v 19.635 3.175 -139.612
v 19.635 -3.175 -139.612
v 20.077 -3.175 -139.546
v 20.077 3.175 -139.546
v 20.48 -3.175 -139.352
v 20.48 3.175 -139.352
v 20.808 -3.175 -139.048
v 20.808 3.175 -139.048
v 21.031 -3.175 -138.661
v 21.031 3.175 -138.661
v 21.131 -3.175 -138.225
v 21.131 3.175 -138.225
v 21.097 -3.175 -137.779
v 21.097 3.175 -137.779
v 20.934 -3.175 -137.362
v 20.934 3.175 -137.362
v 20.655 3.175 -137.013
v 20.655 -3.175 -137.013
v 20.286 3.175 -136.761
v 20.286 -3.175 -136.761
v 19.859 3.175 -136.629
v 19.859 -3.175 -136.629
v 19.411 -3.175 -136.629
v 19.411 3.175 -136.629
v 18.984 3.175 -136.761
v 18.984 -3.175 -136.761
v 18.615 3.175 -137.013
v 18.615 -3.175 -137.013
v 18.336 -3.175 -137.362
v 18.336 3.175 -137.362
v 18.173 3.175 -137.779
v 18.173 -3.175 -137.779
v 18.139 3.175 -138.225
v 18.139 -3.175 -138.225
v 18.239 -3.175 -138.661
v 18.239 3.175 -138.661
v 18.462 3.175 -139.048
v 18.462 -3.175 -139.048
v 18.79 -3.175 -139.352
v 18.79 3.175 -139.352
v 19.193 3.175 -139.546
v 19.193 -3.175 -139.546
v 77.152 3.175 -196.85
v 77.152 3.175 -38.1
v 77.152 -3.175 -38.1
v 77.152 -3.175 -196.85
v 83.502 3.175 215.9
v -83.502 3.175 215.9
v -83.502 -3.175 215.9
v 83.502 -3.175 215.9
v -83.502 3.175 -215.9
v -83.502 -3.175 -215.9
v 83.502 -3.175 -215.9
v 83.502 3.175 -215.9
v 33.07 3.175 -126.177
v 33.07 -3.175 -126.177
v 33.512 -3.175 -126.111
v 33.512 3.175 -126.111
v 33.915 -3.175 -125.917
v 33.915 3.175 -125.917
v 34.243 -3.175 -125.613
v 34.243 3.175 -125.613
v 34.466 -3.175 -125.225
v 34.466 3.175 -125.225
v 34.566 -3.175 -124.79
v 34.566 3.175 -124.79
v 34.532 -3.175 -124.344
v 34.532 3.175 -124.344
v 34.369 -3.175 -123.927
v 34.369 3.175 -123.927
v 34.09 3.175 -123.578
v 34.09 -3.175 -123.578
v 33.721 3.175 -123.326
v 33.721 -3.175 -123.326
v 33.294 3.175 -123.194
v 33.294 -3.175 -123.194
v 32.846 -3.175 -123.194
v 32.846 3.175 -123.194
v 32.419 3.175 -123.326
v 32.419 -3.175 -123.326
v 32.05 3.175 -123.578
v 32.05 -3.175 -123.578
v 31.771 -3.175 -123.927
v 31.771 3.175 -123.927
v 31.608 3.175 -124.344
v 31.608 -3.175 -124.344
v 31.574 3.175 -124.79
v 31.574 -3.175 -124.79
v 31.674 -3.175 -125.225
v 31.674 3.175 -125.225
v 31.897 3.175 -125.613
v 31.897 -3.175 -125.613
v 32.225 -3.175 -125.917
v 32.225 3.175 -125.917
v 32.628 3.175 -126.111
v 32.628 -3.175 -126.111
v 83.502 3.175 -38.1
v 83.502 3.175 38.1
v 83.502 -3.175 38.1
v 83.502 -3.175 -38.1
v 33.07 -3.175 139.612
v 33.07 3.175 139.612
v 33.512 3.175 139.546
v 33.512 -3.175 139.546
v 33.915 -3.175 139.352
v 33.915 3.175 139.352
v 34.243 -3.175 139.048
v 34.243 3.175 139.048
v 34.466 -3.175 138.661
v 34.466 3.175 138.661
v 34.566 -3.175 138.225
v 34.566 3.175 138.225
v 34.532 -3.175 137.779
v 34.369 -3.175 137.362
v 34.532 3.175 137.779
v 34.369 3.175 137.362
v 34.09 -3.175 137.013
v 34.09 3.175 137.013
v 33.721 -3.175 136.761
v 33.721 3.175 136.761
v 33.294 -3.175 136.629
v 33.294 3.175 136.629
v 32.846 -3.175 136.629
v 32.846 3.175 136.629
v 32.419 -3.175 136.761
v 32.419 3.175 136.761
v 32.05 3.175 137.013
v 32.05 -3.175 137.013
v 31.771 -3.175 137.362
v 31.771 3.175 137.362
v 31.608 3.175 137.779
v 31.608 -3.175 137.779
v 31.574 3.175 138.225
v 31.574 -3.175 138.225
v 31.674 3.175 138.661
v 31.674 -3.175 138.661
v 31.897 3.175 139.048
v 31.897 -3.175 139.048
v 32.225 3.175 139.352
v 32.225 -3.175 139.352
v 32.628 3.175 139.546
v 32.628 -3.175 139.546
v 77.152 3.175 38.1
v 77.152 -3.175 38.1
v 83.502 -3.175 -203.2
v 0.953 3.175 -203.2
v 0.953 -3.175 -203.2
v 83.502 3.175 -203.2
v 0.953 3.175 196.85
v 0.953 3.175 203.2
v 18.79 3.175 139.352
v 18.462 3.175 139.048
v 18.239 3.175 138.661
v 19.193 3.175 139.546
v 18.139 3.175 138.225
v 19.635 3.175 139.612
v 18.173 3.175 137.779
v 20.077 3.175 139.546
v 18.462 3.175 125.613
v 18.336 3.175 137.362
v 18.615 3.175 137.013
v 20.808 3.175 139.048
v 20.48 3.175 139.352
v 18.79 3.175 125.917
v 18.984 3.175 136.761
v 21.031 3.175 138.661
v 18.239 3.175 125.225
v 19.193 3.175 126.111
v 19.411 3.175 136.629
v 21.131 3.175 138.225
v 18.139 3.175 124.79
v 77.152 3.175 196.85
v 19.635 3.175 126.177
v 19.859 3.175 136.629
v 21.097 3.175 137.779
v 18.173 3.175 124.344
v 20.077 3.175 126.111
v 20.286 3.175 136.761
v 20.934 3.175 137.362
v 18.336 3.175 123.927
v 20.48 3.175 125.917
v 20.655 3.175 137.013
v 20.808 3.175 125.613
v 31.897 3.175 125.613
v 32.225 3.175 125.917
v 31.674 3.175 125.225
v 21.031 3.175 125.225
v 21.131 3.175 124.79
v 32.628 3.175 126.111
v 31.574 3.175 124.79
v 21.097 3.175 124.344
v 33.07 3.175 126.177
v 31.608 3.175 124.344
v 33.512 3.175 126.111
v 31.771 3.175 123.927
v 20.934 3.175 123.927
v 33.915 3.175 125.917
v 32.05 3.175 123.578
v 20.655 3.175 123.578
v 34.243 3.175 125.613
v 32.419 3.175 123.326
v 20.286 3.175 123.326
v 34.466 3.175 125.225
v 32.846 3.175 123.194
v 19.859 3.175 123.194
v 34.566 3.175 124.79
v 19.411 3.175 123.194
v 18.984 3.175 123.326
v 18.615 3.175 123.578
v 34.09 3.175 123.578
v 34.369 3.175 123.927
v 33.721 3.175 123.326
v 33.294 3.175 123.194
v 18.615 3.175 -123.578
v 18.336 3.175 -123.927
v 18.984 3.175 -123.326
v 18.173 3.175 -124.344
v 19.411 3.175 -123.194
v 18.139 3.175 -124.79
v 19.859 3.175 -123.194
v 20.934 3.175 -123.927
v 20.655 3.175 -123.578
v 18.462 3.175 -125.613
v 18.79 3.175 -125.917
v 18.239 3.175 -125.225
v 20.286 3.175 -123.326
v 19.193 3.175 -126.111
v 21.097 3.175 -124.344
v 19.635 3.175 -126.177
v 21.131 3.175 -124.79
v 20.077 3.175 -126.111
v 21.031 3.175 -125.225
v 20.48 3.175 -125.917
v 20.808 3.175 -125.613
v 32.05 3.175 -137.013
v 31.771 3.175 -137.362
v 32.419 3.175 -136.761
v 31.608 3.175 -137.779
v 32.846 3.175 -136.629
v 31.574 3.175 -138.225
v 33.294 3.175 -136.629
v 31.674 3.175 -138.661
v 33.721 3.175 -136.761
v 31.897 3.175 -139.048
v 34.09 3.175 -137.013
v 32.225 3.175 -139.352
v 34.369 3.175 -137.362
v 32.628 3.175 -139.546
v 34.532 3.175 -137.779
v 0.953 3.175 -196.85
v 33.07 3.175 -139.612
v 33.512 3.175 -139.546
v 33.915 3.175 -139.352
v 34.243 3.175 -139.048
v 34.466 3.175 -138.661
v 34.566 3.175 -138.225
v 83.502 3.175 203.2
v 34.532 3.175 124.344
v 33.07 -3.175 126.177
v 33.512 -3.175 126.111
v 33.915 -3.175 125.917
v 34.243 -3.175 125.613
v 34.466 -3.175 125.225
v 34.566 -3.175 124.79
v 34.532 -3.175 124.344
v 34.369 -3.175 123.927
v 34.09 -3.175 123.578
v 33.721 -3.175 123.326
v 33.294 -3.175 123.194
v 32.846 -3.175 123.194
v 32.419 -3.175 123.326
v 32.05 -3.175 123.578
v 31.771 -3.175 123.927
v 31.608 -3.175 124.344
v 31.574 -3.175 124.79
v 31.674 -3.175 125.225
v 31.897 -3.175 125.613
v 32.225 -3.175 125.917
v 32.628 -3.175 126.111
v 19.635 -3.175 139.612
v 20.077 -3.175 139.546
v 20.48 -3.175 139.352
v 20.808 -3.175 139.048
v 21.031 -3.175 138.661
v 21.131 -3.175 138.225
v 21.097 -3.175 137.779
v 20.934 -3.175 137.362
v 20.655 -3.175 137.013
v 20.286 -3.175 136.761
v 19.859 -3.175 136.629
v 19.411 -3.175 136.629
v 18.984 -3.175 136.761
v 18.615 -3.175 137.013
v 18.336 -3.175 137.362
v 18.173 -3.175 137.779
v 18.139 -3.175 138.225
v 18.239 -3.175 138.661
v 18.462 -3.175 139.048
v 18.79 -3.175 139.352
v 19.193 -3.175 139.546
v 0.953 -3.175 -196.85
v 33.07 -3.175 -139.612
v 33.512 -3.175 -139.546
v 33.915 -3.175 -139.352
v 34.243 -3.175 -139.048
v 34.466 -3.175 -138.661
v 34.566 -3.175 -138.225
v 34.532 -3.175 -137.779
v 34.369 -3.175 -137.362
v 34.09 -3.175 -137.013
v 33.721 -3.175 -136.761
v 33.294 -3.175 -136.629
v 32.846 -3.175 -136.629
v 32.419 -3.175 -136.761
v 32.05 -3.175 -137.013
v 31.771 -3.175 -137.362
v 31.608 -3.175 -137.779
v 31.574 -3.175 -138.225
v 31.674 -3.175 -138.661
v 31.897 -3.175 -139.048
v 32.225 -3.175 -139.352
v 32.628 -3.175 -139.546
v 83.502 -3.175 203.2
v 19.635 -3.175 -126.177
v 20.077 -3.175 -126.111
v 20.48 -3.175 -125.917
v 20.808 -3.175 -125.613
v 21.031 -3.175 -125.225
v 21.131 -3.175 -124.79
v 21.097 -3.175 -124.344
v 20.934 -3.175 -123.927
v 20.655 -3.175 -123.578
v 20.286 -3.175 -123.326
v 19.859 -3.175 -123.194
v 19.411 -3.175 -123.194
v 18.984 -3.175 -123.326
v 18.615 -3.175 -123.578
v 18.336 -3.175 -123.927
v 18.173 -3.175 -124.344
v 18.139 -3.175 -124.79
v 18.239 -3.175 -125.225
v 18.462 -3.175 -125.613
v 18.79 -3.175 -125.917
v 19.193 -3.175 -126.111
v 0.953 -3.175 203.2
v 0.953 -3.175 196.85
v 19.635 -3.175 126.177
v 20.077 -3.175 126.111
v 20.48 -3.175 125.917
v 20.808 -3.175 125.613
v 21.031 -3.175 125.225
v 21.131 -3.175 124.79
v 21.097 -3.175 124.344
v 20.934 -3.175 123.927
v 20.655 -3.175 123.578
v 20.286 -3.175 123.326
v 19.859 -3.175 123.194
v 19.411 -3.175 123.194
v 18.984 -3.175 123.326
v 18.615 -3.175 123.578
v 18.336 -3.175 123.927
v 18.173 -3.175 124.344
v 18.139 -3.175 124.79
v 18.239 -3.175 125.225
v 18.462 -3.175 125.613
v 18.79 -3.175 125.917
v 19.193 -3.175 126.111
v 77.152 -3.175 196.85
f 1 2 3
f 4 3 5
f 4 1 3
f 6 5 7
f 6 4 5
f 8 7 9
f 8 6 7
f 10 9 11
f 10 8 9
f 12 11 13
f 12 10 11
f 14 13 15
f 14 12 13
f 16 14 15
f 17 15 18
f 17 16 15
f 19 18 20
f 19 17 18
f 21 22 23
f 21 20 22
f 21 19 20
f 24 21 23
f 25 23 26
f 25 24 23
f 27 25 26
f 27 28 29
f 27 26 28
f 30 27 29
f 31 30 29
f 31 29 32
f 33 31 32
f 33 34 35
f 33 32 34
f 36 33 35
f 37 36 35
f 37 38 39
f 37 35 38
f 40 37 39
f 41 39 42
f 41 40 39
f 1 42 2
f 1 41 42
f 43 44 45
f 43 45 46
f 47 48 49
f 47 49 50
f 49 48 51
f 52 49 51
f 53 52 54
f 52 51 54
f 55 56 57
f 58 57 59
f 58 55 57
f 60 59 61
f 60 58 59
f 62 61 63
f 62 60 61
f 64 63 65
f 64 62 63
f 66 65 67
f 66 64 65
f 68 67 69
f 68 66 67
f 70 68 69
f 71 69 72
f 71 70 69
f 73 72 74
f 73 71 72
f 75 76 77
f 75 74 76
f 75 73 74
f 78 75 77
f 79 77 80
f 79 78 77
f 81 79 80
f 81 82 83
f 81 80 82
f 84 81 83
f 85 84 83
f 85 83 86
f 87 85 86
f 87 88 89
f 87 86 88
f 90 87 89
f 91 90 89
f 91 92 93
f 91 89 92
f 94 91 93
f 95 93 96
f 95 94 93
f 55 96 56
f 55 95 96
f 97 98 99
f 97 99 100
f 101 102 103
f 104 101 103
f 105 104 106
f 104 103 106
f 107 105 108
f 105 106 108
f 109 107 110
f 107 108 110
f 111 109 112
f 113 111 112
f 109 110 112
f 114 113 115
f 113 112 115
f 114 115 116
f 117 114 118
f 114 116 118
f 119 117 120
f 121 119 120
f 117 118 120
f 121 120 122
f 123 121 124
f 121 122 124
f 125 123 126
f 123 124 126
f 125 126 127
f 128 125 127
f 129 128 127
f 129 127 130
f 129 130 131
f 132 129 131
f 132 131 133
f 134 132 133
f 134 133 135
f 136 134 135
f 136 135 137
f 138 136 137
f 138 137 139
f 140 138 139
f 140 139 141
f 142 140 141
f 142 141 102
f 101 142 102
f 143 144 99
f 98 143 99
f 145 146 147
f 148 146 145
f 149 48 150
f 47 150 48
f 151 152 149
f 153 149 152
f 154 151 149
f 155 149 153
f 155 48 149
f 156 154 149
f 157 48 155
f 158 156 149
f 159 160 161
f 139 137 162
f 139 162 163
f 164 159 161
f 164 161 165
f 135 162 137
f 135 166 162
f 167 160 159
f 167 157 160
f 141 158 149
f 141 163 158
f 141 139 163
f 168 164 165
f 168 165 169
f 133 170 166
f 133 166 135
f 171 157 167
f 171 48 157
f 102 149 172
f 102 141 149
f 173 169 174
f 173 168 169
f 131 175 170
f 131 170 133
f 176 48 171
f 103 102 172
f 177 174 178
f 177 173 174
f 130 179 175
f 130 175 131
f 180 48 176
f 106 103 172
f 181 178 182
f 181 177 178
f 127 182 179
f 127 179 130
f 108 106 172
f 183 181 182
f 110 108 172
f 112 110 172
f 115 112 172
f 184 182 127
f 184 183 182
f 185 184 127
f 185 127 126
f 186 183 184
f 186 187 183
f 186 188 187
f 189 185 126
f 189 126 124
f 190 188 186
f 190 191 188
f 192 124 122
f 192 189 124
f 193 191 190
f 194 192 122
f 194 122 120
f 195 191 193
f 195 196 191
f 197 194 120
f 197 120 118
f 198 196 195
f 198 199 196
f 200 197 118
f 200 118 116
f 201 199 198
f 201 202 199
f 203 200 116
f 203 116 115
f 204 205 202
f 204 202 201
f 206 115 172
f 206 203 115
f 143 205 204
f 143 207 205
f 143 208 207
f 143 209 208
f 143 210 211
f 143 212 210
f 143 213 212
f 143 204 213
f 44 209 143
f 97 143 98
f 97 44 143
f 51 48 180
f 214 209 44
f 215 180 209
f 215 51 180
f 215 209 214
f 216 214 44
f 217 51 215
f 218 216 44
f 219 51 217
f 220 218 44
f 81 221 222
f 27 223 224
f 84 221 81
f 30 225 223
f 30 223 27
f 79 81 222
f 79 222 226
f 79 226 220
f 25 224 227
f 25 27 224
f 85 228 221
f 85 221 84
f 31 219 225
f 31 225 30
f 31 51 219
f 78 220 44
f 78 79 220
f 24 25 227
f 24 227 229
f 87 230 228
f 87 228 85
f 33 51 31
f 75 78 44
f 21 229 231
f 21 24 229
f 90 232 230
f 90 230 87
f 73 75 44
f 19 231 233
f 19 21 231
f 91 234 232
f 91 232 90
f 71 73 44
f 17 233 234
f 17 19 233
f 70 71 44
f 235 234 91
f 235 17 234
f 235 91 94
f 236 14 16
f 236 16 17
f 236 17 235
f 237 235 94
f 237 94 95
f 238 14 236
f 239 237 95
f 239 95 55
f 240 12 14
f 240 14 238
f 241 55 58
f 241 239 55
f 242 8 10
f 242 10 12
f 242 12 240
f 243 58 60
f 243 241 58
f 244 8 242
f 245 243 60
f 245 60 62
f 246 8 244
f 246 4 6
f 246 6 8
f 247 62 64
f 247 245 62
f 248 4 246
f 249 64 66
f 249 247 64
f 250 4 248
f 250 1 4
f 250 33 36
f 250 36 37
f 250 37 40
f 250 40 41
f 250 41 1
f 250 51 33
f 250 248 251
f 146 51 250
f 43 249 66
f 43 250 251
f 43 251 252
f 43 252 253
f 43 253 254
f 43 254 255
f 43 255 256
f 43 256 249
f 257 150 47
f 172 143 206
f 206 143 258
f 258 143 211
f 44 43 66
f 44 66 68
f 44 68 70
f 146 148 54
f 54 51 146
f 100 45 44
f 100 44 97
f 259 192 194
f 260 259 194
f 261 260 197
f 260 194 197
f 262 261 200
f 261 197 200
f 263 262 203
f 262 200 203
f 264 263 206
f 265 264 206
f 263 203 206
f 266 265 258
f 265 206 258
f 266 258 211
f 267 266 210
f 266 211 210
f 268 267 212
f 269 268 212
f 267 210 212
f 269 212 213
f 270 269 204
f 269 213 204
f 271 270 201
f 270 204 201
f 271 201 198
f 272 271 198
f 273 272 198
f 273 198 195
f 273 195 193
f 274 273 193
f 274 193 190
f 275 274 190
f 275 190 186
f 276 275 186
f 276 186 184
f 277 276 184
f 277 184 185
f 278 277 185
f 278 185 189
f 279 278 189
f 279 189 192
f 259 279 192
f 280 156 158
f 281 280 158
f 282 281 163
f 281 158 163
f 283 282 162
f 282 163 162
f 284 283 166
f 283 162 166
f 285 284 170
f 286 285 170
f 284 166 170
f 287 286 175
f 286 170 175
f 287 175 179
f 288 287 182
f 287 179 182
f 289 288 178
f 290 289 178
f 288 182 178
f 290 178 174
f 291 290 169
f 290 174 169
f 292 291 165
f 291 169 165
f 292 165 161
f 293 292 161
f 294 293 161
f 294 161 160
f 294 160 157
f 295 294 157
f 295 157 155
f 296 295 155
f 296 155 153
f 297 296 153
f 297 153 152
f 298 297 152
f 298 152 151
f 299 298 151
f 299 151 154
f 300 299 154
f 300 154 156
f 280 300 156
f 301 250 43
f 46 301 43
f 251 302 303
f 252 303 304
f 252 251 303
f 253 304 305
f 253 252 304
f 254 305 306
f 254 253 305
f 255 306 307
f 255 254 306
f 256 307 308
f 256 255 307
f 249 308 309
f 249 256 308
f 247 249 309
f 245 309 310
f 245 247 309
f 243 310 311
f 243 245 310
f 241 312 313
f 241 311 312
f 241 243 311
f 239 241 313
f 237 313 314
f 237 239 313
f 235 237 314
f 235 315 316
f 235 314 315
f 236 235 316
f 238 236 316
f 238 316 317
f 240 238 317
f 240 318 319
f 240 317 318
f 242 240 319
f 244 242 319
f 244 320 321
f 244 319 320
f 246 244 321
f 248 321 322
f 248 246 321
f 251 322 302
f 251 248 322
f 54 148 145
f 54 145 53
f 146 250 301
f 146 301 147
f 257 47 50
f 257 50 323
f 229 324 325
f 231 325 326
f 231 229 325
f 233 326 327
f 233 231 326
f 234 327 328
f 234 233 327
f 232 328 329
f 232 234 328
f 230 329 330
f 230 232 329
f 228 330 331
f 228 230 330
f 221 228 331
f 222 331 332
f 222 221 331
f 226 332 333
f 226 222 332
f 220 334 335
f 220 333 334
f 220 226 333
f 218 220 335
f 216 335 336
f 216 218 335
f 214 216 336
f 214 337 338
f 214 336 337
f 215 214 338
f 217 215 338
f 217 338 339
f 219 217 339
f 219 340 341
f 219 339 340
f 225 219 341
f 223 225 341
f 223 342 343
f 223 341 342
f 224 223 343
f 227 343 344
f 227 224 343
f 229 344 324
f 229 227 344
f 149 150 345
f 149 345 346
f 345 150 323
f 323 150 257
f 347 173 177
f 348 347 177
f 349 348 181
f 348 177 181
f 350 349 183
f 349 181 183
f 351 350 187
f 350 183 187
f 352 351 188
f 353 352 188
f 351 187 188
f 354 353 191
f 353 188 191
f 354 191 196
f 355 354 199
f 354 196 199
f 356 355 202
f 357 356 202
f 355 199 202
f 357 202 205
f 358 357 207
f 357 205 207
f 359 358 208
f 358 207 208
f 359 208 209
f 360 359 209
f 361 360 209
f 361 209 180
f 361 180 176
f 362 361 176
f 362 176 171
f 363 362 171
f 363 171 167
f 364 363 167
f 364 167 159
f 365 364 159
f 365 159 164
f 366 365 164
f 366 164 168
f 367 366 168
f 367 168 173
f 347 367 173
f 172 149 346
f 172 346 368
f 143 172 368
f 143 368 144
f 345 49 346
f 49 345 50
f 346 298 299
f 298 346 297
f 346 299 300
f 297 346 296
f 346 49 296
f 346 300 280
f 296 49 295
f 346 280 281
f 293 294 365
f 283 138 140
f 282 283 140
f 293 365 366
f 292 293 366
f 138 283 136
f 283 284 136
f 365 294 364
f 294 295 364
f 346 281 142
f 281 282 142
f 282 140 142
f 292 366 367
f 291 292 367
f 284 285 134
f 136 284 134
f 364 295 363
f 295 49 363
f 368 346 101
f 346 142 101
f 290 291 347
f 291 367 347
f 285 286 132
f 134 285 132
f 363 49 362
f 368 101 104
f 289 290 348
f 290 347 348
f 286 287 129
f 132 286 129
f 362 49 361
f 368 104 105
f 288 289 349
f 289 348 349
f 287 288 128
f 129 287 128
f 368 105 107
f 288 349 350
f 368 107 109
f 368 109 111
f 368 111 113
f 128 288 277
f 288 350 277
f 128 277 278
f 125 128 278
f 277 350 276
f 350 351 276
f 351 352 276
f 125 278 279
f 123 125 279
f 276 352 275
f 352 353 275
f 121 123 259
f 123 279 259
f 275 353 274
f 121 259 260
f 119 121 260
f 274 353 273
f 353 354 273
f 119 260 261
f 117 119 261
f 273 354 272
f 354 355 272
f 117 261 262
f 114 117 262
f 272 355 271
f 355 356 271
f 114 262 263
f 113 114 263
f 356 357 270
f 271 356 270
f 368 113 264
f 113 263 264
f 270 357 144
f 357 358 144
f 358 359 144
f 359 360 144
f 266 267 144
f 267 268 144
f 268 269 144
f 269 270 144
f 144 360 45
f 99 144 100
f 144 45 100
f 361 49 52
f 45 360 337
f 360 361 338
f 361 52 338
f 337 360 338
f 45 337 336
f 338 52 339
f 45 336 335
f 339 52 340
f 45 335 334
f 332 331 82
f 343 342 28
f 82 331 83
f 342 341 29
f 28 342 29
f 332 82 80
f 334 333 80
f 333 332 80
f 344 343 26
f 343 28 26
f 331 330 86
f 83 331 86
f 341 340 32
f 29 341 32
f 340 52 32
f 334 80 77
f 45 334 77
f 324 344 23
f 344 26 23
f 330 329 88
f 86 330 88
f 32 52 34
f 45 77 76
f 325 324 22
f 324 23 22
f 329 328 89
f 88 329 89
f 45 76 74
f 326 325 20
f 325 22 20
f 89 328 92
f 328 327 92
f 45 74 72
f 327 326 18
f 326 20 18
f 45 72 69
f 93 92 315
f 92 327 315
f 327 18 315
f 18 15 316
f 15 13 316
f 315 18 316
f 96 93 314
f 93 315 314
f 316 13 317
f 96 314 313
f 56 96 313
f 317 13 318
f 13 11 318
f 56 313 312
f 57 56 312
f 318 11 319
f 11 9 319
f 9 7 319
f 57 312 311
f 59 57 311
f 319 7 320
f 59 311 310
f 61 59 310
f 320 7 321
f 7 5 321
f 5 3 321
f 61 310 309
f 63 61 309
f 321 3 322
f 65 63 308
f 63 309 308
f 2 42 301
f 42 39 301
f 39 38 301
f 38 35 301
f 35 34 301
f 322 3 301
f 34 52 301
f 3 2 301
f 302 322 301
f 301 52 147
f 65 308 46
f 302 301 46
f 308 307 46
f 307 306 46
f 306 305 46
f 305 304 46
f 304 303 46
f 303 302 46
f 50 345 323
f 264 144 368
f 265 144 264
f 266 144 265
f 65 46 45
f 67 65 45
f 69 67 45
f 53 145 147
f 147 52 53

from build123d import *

# Parameters (mm, degrees)
SKETCH2_W           = 167.005
SKETCH2_H           = 431.8
BOSS_EXTRUDE2_DEPTH = 3.175
SKETCH3_W           = 6.35
SKETCH3_H           = 393.7
CUT_EXTRUDE1_DEPTH  = 232.572450879
SKETCH6_R           = 1.5
CUT_EXTRUDE3_DEPTH  = 232.572450879
SKETCH7_W           = 82.55
SKETCH7_H           = 6.35
CUT_EXTRUDE4_DEPTH  = 232.572450879
SKETCH8_W           = 6.35
SKETCH8_H           = 76.2
BOSS_EXTRUDE3_DEPTH = 6.35


with BuildPart() as part:
    # Sketch2 → Boss-Extrude2 (new, symmetric)
    with BuildSketch(Plane(origin=(0, 0, 0), x_dir=(1, 0, 0), z_dir=(0, 1, 0))):
        Rectangle(SKETCH2_W, SKETCH2_H)
    extrude(amount=BOSS_EXTRUDE2_DEPTH, both=True)

    # Sketch3 → Cut-Extrude1 (cut, through all)
    with BuildSketch(Plane(origin=(0, 3.175, 0), x_dir=(1, 0, 0), z_dir=(0, 1, 0))):
        with Locations((80.3275, 0)):
            Rectangle(SKETCH3_W, SKETCH3_H)
    extrude(amount=-CUT_EXTRUDE1_DEPTH, mode=Mode.SUBTRACT)

    # Sketch6 → Cut-Extrude3 (cut, through all)
    with BuildSketch(Plane(origin=(0, 3.175, 0), x_dir=(1, 0, 0), z_dir=(0, 1, 0))):
        with Locations(Location((19.634985579, -124.677471157, 0), (0, 0, 270))):
            Circle(SKETCH6_R)
        with Locations(Location((19.634985579, -138.1125, 0), (0, 0, 270))):
            Circle(SKETCH6_R)
        with Locations(Location((33.070014421, -124.677471157, 0), (0, 0, 270))):
            Circle(SKETCH6_R)
        with Locations(Location((33.070014421, -138.1125, 0), (0, 0, 270))):
            Circle(SKETCH6_R)
    cut_extrude3 = extrude(amount=-CUT_EXTRUDE3_DEPTH, mode=Mode.SUBTRACT)

    # Mirror1: Cut-Extrude3 across plane
    add(cut_extrude3.mirror(Plane.XY), mode=Mode.SUBTRACT)

    # Sketch7 → Cut-Extrude4 (cut, through all)
    with BuildSketch(Plane(origin=(0, 3.175, 0), x_dir=(1, 0, 0), z_dir=(0, 1, 0))):
        with Locations((42.2275, 200.025)):
            Rectangle(SKETCH7_W, SKETCH7_H)
        with Locations((42.2275, -200.025)):
            Rectangle(SKETCH7_W, SKETCH7_H)
    extrude(amount=-CUT_EXTRUDE4_DEPTH, mode=Mode.SUBTRACT)

    # Sketch8 → Boss-Extrude3 (add)
    with BuildSketch(Plane(origin=(0, 3.175, 0), x_dir=(1, 0, 0), z_dir=(0, 1, 0))):
        with Locations((80.3275, 0)):
            Rectangle(SKETCH8_W, SKETCH8_H)
    extrude(amount=-BOSS_EXTRUDE3_DEPTH)


solid = part.part
